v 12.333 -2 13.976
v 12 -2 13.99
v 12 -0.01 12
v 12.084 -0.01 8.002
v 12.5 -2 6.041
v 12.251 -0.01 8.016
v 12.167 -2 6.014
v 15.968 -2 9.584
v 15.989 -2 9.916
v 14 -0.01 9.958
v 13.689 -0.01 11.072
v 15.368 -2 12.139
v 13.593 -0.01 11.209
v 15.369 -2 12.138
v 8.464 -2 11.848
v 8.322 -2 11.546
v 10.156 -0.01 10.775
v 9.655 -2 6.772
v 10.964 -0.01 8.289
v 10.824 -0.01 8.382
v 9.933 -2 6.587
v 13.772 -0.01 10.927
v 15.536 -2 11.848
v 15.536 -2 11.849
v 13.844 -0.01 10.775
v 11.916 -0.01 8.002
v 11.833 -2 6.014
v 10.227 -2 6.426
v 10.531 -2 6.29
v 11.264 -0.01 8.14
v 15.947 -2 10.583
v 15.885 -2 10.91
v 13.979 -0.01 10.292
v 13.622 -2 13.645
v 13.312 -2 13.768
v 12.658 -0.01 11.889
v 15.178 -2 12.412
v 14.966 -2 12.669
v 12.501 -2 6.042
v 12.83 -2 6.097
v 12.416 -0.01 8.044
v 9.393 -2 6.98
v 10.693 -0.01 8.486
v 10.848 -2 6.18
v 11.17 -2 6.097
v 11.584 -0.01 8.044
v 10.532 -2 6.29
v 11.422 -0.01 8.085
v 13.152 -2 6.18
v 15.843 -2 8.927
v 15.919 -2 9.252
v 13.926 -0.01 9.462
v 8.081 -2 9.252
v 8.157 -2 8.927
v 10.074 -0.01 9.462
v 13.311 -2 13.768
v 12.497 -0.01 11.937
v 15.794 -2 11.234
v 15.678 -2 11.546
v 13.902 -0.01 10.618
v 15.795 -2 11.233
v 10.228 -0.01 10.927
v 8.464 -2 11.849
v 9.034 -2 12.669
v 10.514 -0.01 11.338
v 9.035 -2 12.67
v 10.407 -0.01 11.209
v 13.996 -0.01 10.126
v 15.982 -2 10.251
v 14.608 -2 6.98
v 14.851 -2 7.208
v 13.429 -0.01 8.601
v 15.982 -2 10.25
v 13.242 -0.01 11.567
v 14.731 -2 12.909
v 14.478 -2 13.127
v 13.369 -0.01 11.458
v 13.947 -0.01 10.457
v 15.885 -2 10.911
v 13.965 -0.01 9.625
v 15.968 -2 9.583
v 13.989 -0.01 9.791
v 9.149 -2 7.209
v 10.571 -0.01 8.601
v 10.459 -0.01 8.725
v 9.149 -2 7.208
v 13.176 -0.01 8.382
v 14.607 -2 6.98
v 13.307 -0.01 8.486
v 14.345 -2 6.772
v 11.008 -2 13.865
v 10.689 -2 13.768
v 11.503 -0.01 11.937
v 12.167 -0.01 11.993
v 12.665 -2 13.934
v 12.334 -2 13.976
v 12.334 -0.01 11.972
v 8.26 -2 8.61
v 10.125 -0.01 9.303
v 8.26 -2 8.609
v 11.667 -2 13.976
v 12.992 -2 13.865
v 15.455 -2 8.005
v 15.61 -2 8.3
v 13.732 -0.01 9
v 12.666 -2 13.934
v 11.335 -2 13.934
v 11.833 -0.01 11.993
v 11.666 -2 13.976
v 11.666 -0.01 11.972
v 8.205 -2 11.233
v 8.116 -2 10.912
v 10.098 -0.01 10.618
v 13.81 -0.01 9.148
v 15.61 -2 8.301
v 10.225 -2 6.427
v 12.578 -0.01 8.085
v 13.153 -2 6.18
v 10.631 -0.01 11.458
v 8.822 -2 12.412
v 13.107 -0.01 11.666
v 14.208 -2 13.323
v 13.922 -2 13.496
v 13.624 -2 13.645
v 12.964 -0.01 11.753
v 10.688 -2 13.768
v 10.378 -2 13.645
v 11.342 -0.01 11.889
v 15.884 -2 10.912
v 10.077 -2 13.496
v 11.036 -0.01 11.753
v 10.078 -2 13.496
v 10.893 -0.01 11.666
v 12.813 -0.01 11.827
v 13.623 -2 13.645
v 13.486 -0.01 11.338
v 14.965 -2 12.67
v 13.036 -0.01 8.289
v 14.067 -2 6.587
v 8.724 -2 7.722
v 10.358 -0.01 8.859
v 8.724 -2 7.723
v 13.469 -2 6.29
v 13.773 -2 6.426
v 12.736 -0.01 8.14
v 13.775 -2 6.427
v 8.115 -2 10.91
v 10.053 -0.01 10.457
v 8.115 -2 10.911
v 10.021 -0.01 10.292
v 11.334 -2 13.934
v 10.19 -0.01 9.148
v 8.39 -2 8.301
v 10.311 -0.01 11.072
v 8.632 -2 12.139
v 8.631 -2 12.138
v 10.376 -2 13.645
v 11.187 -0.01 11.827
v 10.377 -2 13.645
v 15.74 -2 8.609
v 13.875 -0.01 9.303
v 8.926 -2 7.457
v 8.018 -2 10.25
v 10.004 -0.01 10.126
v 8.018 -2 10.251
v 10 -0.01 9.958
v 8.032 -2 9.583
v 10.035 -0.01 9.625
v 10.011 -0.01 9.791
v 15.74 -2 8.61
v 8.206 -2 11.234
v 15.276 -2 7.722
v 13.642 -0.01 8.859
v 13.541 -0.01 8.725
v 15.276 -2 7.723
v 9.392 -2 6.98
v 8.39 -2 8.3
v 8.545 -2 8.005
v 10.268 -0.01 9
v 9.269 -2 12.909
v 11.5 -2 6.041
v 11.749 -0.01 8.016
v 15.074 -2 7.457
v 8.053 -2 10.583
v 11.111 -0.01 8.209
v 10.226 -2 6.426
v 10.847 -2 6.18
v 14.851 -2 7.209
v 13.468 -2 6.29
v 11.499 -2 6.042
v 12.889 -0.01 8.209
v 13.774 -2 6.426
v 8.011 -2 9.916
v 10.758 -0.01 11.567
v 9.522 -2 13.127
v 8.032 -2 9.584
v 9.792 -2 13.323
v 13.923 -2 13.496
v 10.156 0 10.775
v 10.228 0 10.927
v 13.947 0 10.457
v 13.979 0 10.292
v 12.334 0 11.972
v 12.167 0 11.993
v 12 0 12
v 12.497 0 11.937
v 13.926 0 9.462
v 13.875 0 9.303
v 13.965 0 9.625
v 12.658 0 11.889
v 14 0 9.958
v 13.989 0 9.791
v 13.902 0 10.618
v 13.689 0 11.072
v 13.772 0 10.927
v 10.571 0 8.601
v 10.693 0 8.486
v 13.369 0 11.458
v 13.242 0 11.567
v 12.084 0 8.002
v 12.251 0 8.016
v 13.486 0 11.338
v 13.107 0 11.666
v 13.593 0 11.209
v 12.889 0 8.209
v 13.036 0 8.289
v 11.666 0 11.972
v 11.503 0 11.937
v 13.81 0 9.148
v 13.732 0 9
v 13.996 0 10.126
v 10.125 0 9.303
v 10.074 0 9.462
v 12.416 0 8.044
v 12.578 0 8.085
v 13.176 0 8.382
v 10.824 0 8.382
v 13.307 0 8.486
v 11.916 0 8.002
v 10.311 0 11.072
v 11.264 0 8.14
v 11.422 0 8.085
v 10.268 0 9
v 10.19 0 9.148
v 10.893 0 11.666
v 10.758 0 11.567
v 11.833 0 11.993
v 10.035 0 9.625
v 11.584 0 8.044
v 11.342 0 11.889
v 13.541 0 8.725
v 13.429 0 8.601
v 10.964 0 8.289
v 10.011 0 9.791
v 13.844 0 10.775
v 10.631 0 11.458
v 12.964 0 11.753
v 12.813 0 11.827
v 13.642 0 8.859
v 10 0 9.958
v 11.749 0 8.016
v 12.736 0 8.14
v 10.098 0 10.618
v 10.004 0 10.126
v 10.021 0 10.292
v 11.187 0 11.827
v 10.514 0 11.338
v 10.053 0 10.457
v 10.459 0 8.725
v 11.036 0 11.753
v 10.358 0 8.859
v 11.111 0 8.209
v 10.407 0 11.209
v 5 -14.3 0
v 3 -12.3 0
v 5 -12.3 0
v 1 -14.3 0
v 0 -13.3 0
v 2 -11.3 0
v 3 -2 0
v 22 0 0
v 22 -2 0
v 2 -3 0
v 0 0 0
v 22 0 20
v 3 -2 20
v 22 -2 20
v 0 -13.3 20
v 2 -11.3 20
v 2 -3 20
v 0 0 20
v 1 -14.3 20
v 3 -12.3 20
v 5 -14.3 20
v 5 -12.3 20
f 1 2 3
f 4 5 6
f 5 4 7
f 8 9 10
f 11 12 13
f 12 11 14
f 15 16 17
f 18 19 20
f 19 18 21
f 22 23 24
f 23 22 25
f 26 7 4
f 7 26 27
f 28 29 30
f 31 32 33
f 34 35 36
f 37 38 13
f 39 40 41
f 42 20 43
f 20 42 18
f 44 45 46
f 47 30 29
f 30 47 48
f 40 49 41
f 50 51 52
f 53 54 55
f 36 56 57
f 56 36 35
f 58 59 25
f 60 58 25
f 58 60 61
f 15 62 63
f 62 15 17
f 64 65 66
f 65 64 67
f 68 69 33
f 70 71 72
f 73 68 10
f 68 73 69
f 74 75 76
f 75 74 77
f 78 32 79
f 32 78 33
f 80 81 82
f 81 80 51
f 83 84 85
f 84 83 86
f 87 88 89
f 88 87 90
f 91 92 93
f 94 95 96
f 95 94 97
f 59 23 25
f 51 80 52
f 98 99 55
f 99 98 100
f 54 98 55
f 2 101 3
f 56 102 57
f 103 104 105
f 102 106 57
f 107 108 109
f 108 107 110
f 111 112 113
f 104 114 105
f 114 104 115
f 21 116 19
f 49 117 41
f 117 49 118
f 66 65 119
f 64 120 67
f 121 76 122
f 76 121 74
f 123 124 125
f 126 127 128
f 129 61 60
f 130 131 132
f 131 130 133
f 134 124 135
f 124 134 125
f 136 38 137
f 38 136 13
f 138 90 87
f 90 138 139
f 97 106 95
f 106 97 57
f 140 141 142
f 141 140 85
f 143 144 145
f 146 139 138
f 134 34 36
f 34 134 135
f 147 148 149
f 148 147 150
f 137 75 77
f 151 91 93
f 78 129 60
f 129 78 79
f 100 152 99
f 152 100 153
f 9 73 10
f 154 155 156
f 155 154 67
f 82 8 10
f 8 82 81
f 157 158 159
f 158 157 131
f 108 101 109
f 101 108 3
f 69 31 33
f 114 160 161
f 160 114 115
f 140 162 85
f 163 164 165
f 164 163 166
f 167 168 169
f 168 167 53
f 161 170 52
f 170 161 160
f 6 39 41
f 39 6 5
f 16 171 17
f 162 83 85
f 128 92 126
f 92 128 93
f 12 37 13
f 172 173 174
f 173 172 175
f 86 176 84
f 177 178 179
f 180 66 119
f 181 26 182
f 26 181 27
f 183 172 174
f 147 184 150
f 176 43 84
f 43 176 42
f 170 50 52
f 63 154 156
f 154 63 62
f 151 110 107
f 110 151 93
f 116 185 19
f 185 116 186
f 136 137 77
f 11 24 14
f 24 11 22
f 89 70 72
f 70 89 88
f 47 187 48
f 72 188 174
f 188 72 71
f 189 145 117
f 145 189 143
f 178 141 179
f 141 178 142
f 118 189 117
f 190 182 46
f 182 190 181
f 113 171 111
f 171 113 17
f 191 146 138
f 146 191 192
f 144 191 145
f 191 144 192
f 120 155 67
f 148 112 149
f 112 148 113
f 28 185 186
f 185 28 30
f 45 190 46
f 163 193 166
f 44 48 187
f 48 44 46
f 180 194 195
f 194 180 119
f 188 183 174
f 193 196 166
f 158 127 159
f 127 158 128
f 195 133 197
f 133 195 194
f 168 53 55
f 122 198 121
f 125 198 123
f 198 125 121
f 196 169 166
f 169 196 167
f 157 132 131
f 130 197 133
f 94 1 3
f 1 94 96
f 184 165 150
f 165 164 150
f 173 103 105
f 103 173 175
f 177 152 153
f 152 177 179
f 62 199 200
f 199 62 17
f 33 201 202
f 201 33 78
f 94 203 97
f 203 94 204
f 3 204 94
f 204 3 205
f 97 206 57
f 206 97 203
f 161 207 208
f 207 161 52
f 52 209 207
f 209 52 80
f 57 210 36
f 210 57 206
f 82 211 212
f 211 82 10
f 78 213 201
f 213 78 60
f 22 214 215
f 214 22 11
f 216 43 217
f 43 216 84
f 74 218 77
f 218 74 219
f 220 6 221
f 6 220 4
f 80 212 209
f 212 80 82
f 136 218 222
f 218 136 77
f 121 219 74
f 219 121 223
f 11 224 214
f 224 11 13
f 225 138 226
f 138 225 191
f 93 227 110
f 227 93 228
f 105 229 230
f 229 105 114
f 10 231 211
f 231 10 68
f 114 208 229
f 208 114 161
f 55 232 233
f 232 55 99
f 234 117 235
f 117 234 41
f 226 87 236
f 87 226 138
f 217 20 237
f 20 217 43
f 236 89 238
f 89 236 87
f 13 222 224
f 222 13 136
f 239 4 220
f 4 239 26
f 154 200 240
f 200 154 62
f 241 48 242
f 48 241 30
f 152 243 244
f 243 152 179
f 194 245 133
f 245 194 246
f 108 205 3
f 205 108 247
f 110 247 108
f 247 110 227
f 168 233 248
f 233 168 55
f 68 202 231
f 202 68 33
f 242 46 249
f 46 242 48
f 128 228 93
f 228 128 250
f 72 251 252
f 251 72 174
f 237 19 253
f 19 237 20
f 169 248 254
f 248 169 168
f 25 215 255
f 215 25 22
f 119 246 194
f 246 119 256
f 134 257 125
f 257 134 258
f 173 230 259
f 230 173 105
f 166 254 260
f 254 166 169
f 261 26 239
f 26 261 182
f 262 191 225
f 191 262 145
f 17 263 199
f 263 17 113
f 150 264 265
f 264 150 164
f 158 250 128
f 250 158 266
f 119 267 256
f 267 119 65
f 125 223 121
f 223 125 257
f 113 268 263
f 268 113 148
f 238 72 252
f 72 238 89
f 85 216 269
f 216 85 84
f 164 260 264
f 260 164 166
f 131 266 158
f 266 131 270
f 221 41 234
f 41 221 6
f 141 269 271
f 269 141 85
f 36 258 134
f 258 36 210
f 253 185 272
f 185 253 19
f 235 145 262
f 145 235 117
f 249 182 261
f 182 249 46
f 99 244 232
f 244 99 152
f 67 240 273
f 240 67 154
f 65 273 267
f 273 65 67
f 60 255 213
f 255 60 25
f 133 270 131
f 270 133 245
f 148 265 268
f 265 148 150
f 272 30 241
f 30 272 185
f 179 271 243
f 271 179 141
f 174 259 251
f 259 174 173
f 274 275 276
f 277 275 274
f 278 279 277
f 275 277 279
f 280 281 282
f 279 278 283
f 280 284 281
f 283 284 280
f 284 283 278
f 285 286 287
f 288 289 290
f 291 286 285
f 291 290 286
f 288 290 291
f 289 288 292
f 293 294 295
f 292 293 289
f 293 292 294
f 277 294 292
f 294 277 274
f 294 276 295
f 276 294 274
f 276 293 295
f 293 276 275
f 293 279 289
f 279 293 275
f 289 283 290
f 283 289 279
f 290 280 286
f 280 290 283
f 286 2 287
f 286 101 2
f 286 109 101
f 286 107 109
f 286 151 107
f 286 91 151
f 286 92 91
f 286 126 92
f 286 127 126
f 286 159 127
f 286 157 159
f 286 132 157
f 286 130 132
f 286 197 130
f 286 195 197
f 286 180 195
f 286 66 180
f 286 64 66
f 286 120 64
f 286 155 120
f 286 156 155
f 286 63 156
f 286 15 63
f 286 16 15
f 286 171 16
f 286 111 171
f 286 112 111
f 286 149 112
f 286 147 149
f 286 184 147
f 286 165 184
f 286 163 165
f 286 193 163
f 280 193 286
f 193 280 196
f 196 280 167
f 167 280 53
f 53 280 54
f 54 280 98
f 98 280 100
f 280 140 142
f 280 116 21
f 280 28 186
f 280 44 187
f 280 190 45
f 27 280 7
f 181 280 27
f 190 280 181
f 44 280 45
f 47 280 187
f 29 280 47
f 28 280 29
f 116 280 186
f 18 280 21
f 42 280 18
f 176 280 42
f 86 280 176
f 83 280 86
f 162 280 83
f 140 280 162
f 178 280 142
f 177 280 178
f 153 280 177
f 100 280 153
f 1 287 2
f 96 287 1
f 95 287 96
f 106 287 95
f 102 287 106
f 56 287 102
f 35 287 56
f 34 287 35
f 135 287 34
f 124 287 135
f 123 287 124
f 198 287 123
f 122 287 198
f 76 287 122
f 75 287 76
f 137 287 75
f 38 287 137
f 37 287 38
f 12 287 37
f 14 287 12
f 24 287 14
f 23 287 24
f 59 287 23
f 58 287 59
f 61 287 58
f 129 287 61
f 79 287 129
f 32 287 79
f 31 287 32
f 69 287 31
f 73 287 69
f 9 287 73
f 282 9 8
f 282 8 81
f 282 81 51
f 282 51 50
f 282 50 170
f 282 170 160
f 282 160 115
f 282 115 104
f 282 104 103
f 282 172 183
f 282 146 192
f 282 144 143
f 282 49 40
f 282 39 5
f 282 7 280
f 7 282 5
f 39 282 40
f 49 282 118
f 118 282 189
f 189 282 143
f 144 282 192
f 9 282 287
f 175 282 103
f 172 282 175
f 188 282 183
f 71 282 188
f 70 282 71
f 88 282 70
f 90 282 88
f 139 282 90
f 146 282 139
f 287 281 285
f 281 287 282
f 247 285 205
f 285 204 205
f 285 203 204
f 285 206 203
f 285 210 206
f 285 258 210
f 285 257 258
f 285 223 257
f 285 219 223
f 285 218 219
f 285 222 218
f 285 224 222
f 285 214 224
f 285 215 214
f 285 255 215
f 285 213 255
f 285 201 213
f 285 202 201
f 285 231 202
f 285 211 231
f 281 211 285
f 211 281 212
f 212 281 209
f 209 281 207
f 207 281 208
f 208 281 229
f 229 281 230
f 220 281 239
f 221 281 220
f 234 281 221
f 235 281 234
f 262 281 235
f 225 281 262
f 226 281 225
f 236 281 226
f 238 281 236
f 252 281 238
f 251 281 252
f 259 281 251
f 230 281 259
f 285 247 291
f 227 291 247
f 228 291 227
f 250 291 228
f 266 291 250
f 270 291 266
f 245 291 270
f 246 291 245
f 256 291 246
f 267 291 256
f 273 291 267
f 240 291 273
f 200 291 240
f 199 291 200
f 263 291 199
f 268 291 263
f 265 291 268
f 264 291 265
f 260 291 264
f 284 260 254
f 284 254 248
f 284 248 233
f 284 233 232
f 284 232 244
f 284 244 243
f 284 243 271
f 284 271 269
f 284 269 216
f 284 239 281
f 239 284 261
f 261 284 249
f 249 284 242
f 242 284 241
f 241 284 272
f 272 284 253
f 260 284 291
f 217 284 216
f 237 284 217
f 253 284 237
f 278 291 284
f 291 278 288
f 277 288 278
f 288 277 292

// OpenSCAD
// Customizable Wall Bracket
// (c) 2013 Wouter Robers

// How thick is the thing you want to bracket?
ClampSize=10.3;

// Material thickness (thicker makes stronger, but less flexible).
Thickness=2;

// Height of the rim in the front of the bracket
RimHeight=3;

// Corner bevel size (bigger bevel gives better strength)
Corner=1;

// Screw hole
screwSize=4;

// Clamp width
Width=20;

MakeBracket();

module MakeBracket() {
  rotate([0,0,-90]) difference() {
    linear_extrude(height = Width)
    polygon([[0, 0],[0, 20 + Thickness],[Thickness, 20 + Thickness],[Thickness, Thickness + Corner],[Thickness + Corner,Thickness],[Thickness + ClampSize-Corner, Thickness],[Thickness + ClampSize, Thickness + Corner],[Thickness + ClampSize, Thickness + RimHeight],[2 * Thickness + ClampSize, Thickness + RimHeight],[2 * Thickness + ClampSize, Corner],[2 * Thickness + ClampSize-Corner, 0]]);

    translate([Thickness + 0.01, Width / 2 + Thickness, Width / 2]) 
      rotate([0, 270, 0]) {
        cylinder(h = screwSize / 2, d2 = screwSize, d1 = screwSize * 2, $fn = 75);
        cylinder(h = Thickness + 0.02, d2 = screwSize, d1 = screwSize, $fn = 75);
      }
  }
}
